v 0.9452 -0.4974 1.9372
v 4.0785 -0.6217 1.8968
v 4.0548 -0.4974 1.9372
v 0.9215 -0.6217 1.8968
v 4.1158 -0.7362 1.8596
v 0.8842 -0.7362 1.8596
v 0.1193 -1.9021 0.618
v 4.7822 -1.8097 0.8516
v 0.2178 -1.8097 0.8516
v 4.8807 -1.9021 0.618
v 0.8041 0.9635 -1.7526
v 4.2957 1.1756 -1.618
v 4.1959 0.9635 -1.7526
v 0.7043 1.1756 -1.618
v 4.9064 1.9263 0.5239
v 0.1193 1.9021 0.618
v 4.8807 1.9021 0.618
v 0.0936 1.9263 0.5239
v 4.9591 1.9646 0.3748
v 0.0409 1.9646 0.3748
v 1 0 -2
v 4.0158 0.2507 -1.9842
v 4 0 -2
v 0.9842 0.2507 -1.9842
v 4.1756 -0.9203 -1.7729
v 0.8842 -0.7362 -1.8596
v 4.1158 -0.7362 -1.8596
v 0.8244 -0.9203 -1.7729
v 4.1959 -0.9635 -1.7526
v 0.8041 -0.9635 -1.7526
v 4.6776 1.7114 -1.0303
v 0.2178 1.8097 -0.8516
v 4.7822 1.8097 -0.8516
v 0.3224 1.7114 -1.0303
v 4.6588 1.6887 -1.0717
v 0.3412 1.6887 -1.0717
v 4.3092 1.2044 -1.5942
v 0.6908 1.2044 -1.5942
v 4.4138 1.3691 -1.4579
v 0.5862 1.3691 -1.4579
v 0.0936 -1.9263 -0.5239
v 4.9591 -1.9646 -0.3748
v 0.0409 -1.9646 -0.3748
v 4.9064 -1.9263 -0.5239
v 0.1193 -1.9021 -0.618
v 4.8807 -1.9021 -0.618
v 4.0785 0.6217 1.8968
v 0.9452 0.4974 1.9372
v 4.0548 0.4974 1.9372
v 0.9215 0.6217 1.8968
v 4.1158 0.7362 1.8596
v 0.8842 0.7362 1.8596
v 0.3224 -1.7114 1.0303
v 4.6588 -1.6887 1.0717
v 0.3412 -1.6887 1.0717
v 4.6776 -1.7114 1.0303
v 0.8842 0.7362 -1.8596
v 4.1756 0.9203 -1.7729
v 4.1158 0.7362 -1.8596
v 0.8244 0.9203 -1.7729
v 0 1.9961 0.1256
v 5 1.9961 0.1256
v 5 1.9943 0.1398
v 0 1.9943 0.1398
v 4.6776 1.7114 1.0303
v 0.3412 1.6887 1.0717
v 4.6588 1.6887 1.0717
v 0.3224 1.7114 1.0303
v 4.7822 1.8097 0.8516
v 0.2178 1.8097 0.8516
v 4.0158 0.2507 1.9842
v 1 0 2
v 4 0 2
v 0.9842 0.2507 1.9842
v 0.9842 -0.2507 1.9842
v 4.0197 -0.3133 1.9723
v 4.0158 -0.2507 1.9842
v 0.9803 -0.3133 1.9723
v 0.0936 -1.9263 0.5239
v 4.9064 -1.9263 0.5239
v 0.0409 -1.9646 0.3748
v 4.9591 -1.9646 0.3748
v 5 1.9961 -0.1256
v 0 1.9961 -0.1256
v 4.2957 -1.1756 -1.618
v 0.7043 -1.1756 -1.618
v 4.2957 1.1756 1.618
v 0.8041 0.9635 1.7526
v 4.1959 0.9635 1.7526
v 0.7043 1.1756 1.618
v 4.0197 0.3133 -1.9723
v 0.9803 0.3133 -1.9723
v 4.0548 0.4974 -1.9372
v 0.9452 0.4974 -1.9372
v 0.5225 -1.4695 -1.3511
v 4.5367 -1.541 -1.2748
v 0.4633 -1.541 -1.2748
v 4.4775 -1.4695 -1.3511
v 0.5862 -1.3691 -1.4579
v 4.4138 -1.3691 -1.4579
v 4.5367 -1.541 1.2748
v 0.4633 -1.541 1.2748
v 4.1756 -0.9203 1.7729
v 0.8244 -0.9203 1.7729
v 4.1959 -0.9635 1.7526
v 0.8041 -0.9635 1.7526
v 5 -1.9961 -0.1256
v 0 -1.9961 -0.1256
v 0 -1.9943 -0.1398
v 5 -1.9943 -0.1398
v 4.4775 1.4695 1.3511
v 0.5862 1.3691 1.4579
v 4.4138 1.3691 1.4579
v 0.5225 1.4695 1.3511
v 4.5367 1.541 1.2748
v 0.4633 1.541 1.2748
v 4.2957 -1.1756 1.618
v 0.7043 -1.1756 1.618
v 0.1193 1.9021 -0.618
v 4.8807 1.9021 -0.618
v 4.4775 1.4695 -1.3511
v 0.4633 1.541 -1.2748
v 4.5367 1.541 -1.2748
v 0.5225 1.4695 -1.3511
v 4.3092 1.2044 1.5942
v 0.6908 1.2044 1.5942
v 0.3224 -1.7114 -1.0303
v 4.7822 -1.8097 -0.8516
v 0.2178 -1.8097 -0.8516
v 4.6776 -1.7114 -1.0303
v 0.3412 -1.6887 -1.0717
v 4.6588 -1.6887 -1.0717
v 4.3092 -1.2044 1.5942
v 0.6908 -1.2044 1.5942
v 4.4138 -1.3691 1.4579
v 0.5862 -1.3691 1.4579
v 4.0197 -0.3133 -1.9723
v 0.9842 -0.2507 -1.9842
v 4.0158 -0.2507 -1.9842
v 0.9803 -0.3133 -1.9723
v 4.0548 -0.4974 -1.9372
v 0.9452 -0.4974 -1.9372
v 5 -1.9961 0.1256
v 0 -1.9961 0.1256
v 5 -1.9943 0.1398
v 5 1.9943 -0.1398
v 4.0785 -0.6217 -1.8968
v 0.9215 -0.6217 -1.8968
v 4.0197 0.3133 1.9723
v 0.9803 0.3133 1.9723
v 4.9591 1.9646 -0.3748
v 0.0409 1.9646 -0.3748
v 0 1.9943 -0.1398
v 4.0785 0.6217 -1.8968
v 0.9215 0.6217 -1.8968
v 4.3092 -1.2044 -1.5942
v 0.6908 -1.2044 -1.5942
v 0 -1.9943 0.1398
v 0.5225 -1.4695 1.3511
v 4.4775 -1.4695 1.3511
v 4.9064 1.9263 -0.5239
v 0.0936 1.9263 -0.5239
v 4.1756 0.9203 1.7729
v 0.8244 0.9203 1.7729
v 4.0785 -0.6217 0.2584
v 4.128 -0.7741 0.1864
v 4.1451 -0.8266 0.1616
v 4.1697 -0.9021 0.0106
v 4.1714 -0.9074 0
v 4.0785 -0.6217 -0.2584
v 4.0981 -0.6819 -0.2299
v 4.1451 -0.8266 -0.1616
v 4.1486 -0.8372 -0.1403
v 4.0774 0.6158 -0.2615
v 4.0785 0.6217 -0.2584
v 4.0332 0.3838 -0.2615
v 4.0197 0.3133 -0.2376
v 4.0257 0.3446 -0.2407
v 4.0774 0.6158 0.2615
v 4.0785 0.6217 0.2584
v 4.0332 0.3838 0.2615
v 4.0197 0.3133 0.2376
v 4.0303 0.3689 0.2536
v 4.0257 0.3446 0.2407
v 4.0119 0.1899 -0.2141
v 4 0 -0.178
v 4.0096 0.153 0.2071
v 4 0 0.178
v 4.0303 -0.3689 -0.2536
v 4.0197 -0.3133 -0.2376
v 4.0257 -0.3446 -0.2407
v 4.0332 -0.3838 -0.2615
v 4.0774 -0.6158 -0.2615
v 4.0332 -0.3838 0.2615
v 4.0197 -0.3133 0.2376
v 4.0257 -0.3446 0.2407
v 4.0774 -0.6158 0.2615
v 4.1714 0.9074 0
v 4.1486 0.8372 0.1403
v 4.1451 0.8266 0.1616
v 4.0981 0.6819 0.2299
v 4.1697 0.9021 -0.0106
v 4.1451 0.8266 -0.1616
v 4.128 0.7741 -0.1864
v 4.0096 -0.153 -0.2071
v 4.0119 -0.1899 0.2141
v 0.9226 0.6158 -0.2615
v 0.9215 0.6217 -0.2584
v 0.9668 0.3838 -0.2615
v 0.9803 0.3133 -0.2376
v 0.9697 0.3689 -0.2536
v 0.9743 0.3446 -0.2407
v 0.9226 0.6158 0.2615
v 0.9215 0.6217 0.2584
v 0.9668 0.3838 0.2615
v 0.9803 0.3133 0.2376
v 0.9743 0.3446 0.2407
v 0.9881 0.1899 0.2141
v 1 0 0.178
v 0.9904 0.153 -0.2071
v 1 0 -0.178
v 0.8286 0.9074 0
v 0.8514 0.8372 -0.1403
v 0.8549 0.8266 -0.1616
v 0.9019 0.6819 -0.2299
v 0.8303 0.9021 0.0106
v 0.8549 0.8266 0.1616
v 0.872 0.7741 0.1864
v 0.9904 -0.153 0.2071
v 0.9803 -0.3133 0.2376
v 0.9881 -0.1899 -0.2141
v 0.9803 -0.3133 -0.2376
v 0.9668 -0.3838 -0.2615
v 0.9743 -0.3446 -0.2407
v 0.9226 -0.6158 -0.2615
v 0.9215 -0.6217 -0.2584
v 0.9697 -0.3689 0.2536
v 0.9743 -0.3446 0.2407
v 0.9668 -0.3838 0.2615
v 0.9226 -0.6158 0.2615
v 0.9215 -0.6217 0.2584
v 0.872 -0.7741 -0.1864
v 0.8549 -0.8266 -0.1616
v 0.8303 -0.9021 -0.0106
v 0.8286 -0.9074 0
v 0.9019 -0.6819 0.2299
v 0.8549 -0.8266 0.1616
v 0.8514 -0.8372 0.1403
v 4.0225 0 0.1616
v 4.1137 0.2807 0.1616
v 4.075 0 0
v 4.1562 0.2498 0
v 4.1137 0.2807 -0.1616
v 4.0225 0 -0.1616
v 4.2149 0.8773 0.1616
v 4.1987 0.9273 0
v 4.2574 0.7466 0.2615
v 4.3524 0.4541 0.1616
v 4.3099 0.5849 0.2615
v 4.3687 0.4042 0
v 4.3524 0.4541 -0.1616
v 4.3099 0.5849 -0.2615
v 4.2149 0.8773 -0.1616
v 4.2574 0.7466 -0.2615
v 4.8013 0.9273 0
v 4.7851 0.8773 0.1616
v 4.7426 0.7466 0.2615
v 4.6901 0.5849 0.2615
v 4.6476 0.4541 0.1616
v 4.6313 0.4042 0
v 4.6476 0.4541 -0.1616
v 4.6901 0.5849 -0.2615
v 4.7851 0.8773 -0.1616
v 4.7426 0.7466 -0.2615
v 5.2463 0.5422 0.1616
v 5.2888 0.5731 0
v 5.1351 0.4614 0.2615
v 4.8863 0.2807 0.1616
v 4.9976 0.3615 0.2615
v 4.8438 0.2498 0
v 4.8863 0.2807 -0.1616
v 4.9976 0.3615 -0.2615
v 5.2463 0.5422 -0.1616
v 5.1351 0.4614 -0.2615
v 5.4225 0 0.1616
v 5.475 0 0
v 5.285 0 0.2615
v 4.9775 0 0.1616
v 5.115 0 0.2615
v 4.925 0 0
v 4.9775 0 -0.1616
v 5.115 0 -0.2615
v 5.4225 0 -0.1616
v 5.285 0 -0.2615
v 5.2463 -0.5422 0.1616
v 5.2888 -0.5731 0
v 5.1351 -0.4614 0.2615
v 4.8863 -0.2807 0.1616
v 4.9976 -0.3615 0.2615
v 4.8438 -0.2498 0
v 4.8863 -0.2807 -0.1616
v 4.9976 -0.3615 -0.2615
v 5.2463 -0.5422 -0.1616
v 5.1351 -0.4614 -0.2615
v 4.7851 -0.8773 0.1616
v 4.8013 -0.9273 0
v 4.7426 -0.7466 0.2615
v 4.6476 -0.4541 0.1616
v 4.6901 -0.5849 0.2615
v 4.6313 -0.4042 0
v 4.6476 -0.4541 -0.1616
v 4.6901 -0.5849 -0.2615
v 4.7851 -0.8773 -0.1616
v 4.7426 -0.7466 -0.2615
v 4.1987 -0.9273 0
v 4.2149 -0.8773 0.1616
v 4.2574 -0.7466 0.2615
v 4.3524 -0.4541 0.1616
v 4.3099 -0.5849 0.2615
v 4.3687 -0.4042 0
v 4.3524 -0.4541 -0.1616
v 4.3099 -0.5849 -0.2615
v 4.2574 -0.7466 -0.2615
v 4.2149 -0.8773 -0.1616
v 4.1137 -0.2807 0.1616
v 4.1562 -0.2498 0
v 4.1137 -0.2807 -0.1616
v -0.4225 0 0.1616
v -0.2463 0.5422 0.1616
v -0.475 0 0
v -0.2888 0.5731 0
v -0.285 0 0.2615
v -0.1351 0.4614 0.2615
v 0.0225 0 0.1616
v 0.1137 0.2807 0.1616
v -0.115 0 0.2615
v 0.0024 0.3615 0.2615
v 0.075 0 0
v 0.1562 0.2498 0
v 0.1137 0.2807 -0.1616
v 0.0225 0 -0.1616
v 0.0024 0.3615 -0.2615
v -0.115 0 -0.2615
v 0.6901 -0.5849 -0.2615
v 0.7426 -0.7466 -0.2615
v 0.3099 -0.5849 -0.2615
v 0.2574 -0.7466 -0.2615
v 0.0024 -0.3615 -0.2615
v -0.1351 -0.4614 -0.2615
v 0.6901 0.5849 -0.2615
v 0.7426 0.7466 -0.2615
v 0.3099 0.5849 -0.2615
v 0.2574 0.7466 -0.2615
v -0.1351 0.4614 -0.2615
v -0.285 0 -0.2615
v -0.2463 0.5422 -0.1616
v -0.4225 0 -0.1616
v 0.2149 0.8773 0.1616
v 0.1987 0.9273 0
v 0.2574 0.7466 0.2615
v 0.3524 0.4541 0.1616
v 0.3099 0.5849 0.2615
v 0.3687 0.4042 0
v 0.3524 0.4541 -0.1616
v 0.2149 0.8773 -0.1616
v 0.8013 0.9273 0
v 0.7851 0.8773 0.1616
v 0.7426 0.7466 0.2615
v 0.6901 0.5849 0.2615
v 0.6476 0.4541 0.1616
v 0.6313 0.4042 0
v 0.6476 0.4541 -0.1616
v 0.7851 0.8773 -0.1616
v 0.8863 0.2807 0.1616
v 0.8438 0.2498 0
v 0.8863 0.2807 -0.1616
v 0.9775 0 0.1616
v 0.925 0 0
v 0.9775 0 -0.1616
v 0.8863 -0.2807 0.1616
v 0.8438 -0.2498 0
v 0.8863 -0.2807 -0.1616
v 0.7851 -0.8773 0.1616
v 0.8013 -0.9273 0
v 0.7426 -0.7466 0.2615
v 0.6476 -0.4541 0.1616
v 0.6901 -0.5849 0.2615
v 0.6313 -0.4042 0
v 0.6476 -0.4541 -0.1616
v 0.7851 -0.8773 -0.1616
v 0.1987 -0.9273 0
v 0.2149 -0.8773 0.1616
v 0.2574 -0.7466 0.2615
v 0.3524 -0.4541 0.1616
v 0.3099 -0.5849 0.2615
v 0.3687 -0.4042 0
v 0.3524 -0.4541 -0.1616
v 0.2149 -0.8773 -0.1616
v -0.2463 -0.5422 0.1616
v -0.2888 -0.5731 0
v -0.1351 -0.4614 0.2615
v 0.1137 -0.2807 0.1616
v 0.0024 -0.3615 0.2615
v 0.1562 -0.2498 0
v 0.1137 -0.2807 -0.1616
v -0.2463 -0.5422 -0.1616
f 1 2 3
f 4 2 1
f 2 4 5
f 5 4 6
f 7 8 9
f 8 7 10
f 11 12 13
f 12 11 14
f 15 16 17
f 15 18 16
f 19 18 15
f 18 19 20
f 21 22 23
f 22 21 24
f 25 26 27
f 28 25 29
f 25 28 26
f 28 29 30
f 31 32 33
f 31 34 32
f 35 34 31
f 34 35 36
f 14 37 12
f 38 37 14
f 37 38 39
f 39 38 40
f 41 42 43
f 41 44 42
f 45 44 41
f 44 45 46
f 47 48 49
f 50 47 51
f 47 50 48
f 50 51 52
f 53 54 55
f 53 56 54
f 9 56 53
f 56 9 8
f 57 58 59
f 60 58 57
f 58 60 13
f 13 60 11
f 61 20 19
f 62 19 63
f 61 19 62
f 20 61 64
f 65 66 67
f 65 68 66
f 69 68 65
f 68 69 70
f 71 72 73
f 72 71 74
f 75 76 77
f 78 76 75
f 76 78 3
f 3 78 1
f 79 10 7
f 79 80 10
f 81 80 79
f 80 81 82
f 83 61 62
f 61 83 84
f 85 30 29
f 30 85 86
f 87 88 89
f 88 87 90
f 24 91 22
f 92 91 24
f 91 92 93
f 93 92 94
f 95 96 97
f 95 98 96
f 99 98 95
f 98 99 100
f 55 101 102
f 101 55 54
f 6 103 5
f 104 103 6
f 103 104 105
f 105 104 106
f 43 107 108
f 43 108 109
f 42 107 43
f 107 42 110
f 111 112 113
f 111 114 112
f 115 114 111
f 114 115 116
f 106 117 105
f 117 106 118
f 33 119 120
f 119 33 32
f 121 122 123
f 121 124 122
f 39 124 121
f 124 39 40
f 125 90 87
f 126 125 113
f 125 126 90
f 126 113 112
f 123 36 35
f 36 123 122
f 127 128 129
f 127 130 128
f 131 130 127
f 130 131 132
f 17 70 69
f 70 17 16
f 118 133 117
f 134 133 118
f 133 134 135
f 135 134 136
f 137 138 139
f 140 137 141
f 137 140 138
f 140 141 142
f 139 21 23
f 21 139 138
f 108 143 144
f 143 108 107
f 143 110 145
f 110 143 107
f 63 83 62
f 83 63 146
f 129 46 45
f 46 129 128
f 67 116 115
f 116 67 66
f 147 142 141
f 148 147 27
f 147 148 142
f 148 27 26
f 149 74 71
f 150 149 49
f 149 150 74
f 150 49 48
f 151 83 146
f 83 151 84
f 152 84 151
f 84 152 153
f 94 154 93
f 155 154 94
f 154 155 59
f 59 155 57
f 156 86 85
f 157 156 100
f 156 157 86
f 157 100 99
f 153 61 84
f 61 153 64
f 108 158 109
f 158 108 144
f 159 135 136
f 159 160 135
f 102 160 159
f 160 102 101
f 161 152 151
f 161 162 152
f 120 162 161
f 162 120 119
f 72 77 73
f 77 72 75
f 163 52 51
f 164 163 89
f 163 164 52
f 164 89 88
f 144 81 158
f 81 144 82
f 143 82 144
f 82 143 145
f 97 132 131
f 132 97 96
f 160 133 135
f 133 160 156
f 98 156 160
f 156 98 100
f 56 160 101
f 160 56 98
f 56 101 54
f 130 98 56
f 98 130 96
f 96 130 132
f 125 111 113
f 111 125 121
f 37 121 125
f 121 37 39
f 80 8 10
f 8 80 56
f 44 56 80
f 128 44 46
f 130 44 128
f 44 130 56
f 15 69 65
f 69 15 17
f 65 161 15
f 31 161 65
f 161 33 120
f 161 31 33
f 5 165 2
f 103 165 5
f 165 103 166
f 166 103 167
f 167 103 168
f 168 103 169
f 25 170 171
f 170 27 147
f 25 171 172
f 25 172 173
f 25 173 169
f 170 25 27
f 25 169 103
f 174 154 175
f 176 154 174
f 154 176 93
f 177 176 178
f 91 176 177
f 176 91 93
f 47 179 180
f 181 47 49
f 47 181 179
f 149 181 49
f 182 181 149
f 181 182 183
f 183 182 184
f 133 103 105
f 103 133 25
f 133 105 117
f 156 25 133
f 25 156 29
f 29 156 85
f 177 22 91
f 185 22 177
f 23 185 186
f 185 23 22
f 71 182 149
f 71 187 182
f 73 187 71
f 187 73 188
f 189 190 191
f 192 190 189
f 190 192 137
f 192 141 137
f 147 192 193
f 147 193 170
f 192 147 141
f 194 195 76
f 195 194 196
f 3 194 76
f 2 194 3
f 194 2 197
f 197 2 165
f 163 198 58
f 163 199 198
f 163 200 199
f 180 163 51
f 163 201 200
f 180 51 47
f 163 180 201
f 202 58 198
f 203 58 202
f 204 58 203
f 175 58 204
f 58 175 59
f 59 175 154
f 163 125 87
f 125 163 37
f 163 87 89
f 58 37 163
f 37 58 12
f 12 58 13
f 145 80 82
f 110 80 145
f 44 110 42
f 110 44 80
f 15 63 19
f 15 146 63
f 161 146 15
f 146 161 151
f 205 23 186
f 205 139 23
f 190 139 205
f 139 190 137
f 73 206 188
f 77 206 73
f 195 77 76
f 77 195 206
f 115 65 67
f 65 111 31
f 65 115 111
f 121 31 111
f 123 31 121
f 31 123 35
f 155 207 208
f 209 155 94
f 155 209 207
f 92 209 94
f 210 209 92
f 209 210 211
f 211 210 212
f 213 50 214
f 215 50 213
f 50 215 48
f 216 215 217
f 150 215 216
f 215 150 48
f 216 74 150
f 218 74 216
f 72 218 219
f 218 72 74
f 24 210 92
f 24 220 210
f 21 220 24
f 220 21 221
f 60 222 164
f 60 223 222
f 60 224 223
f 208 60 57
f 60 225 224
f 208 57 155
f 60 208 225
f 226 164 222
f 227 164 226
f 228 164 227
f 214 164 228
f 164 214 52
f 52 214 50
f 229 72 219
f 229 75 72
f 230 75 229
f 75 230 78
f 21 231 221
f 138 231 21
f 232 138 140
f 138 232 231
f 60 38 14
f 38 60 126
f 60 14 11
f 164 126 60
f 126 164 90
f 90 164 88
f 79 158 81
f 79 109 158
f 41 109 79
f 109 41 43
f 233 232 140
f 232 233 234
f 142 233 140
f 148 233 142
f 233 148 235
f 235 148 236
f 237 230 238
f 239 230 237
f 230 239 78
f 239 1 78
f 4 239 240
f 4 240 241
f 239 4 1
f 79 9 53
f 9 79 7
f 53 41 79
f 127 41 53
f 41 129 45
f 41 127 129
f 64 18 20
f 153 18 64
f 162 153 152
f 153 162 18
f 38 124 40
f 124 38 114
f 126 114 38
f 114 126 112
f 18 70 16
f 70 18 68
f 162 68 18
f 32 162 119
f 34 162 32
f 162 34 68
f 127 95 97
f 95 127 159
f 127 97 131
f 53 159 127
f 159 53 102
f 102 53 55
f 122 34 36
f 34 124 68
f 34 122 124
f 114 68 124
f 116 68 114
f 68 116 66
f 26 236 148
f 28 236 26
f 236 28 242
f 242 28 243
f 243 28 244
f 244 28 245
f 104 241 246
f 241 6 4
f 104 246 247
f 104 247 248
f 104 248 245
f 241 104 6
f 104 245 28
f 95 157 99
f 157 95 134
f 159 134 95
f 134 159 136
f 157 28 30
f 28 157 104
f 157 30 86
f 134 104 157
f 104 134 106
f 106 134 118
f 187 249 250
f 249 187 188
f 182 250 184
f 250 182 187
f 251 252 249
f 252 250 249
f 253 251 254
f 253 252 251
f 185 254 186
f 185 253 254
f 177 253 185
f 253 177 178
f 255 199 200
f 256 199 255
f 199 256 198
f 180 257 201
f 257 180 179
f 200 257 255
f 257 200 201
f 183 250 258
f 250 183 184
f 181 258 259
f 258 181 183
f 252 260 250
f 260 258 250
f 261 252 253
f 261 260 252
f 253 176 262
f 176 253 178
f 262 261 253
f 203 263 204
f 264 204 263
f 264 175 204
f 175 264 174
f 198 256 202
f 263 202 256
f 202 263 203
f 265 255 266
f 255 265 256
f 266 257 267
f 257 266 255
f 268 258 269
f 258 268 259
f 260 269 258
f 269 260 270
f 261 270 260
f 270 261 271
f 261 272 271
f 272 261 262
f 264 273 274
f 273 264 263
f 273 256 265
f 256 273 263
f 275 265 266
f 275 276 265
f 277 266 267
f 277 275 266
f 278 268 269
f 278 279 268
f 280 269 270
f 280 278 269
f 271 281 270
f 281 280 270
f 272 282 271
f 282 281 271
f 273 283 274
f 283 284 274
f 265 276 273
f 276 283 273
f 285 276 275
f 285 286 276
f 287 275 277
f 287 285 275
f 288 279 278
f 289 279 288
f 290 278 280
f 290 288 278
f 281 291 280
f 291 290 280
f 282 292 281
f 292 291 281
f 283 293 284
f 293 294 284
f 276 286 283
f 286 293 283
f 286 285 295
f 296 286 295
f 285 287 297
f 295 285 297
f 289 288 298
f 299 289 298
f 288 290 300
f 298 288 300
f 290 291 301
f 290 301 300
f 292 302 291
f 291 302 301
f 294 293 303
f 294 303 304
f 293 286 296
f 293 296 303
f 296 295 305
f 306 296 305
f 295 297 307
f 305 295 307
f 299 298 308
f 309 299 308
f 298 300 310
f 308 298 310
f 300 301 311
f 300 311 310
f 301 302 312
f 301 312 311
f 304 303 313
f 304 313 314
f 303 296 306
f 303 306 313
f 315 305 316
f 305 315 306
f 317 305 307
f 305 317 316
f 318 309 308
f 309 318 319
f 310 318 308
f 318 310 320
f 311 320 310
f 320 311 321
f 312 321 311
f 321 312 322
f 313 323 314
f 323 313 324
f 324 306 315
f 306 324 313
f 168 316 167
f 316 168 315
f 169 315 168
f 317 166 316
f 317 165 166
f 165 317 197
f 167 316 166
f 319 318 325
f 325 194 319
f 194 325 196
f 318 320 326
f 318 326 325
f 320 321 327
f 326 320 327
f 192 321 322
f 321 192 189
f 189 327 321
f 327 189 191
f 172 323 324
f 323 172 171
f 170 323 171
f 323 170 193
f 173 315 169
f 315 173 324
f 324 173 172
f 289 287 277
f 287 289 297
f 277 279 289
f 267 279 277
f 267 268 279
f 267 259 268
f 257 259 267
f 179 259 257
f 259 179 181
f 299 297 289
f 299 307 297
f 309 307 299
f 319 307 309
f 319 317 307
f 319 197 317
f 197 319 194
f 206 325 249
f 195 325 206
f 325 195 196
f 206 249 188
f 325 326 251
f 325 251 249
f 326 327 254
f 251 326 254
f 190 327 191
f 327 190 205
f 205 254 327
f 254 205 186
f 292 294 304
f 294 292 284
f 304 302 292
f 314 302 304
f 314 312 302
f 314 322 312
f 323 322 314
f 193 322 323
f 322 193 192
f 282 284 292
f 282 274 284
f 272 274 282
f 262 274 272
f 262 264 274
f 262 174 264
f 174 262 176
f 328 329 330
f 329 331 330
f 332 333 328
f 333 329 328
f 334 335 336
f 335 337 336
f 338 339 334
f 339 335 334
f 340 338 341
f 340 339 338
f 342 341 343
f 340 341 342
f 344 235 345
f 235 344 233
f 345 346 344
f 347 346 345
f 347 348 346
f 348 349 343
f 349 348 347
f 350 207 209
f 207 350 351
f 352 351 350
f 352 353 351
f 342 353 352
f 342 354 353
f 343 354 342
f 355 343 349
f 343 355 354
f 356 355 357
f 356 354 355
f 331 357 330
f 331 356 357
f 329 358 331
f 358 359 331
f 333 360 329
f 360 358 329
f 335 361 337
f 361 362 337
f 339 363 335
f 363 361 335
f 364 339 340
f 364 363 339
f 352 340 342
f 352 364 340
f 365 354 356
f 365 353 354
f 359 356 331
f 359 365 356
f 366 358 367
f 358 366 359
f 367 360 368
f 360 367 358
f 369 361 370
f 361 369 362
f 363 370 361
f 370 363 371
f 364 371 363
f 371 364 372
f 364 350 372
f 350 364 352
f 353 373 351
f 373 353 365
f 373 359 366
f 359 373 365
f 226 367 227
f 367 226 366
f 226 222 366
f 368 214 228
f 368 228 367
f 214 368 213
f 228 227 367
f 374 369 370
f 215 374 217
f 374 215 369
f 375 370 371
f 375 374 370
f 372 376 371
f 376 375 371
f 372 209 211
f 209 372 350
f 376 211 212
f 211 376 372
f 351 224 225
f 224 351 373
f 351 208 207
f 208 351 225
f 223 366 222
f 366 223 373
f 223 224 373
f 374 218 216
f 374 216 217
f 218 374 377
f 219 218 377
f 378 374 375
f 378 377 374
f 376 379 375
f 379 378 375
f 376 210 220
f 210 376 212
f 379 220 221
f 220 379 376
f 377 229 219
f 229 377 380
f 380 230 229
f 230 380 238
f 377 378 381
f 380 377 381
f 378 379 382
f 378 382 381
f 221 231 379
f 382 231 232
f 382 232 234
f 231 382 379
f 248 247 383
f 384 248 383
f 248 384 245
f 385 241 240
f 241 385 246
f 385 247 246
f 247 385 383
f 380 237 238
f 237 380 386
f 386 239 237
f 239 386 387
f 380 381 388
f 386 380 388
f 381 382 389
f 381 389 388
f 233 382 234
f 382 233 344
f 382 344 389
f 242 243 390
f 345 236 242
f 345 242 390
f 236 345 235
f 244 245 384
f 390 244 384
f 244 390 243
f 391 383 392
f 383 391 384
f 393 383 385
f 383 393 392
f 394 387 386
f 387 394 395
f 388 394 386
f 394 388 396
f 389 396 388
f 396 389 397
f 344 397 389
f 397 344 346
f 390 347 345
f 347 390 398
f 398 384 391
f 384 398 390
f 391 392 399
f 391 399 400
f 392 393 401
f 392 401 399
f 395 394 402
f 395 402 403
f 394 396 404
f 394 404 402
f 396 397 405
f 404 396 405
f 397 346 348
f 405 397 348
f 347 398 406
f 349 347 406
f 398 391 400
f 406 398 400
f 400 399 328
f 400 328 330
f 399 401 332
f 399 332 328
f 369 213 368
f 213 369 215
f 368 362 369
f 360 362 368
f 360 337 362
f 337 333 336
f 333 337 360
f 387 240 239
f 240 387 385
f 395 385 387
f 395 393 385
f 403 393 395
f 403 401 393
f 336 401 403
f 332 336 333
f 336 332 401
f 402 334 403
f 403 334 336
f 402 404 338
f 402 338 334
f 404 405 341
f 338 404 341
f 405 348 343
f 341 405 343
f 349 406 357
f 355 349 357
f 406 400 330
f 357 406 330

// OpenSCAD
// file: node.scad
module node(
    node_diameter = 0.7,
    node_thickness = 0.55,
) {
        $fn = 10;
        rotate_extrude() {
            translate([node_diameter, 0, 0])
            circle(d = node_thickness);
        }
    }
// main file
/*
    Daniel Peña Cruz
    FAB Academy 2026
    Week #2 - CAD
    
    Final Project Sketch
    Link Joint file
*/

// Import //
use <node.scad>

// Visualization //
link_joint();

// Module(s)
module link_joint(
    joint_lenght = 5,
    tentacle_diameter = 4,
    node_indentation = 4.5
) {
    $fn = 50;
        union(){
            // Body
            difference() {
                rotate([0, 90, 0])
                cylinder(joint_lenght, d = tentacle_diameter);
                
                translate([6.5, 0, -tentacle_diameter / 2])
                cylinder(joint_lenght * 0.8, d = tentacle_diameter +1);
           
                translate([-1.5, 0, -tentacle_diameter / 2])
                cylinder(joint_lenght * 0.8, d = tentacle_diameter +1);
            }
            
            // Joints
            translate([node_indentation, 0, 0])
            node();
            
            translate([node_indentation - 4, 0, 0])
            node();
        }    
    }
